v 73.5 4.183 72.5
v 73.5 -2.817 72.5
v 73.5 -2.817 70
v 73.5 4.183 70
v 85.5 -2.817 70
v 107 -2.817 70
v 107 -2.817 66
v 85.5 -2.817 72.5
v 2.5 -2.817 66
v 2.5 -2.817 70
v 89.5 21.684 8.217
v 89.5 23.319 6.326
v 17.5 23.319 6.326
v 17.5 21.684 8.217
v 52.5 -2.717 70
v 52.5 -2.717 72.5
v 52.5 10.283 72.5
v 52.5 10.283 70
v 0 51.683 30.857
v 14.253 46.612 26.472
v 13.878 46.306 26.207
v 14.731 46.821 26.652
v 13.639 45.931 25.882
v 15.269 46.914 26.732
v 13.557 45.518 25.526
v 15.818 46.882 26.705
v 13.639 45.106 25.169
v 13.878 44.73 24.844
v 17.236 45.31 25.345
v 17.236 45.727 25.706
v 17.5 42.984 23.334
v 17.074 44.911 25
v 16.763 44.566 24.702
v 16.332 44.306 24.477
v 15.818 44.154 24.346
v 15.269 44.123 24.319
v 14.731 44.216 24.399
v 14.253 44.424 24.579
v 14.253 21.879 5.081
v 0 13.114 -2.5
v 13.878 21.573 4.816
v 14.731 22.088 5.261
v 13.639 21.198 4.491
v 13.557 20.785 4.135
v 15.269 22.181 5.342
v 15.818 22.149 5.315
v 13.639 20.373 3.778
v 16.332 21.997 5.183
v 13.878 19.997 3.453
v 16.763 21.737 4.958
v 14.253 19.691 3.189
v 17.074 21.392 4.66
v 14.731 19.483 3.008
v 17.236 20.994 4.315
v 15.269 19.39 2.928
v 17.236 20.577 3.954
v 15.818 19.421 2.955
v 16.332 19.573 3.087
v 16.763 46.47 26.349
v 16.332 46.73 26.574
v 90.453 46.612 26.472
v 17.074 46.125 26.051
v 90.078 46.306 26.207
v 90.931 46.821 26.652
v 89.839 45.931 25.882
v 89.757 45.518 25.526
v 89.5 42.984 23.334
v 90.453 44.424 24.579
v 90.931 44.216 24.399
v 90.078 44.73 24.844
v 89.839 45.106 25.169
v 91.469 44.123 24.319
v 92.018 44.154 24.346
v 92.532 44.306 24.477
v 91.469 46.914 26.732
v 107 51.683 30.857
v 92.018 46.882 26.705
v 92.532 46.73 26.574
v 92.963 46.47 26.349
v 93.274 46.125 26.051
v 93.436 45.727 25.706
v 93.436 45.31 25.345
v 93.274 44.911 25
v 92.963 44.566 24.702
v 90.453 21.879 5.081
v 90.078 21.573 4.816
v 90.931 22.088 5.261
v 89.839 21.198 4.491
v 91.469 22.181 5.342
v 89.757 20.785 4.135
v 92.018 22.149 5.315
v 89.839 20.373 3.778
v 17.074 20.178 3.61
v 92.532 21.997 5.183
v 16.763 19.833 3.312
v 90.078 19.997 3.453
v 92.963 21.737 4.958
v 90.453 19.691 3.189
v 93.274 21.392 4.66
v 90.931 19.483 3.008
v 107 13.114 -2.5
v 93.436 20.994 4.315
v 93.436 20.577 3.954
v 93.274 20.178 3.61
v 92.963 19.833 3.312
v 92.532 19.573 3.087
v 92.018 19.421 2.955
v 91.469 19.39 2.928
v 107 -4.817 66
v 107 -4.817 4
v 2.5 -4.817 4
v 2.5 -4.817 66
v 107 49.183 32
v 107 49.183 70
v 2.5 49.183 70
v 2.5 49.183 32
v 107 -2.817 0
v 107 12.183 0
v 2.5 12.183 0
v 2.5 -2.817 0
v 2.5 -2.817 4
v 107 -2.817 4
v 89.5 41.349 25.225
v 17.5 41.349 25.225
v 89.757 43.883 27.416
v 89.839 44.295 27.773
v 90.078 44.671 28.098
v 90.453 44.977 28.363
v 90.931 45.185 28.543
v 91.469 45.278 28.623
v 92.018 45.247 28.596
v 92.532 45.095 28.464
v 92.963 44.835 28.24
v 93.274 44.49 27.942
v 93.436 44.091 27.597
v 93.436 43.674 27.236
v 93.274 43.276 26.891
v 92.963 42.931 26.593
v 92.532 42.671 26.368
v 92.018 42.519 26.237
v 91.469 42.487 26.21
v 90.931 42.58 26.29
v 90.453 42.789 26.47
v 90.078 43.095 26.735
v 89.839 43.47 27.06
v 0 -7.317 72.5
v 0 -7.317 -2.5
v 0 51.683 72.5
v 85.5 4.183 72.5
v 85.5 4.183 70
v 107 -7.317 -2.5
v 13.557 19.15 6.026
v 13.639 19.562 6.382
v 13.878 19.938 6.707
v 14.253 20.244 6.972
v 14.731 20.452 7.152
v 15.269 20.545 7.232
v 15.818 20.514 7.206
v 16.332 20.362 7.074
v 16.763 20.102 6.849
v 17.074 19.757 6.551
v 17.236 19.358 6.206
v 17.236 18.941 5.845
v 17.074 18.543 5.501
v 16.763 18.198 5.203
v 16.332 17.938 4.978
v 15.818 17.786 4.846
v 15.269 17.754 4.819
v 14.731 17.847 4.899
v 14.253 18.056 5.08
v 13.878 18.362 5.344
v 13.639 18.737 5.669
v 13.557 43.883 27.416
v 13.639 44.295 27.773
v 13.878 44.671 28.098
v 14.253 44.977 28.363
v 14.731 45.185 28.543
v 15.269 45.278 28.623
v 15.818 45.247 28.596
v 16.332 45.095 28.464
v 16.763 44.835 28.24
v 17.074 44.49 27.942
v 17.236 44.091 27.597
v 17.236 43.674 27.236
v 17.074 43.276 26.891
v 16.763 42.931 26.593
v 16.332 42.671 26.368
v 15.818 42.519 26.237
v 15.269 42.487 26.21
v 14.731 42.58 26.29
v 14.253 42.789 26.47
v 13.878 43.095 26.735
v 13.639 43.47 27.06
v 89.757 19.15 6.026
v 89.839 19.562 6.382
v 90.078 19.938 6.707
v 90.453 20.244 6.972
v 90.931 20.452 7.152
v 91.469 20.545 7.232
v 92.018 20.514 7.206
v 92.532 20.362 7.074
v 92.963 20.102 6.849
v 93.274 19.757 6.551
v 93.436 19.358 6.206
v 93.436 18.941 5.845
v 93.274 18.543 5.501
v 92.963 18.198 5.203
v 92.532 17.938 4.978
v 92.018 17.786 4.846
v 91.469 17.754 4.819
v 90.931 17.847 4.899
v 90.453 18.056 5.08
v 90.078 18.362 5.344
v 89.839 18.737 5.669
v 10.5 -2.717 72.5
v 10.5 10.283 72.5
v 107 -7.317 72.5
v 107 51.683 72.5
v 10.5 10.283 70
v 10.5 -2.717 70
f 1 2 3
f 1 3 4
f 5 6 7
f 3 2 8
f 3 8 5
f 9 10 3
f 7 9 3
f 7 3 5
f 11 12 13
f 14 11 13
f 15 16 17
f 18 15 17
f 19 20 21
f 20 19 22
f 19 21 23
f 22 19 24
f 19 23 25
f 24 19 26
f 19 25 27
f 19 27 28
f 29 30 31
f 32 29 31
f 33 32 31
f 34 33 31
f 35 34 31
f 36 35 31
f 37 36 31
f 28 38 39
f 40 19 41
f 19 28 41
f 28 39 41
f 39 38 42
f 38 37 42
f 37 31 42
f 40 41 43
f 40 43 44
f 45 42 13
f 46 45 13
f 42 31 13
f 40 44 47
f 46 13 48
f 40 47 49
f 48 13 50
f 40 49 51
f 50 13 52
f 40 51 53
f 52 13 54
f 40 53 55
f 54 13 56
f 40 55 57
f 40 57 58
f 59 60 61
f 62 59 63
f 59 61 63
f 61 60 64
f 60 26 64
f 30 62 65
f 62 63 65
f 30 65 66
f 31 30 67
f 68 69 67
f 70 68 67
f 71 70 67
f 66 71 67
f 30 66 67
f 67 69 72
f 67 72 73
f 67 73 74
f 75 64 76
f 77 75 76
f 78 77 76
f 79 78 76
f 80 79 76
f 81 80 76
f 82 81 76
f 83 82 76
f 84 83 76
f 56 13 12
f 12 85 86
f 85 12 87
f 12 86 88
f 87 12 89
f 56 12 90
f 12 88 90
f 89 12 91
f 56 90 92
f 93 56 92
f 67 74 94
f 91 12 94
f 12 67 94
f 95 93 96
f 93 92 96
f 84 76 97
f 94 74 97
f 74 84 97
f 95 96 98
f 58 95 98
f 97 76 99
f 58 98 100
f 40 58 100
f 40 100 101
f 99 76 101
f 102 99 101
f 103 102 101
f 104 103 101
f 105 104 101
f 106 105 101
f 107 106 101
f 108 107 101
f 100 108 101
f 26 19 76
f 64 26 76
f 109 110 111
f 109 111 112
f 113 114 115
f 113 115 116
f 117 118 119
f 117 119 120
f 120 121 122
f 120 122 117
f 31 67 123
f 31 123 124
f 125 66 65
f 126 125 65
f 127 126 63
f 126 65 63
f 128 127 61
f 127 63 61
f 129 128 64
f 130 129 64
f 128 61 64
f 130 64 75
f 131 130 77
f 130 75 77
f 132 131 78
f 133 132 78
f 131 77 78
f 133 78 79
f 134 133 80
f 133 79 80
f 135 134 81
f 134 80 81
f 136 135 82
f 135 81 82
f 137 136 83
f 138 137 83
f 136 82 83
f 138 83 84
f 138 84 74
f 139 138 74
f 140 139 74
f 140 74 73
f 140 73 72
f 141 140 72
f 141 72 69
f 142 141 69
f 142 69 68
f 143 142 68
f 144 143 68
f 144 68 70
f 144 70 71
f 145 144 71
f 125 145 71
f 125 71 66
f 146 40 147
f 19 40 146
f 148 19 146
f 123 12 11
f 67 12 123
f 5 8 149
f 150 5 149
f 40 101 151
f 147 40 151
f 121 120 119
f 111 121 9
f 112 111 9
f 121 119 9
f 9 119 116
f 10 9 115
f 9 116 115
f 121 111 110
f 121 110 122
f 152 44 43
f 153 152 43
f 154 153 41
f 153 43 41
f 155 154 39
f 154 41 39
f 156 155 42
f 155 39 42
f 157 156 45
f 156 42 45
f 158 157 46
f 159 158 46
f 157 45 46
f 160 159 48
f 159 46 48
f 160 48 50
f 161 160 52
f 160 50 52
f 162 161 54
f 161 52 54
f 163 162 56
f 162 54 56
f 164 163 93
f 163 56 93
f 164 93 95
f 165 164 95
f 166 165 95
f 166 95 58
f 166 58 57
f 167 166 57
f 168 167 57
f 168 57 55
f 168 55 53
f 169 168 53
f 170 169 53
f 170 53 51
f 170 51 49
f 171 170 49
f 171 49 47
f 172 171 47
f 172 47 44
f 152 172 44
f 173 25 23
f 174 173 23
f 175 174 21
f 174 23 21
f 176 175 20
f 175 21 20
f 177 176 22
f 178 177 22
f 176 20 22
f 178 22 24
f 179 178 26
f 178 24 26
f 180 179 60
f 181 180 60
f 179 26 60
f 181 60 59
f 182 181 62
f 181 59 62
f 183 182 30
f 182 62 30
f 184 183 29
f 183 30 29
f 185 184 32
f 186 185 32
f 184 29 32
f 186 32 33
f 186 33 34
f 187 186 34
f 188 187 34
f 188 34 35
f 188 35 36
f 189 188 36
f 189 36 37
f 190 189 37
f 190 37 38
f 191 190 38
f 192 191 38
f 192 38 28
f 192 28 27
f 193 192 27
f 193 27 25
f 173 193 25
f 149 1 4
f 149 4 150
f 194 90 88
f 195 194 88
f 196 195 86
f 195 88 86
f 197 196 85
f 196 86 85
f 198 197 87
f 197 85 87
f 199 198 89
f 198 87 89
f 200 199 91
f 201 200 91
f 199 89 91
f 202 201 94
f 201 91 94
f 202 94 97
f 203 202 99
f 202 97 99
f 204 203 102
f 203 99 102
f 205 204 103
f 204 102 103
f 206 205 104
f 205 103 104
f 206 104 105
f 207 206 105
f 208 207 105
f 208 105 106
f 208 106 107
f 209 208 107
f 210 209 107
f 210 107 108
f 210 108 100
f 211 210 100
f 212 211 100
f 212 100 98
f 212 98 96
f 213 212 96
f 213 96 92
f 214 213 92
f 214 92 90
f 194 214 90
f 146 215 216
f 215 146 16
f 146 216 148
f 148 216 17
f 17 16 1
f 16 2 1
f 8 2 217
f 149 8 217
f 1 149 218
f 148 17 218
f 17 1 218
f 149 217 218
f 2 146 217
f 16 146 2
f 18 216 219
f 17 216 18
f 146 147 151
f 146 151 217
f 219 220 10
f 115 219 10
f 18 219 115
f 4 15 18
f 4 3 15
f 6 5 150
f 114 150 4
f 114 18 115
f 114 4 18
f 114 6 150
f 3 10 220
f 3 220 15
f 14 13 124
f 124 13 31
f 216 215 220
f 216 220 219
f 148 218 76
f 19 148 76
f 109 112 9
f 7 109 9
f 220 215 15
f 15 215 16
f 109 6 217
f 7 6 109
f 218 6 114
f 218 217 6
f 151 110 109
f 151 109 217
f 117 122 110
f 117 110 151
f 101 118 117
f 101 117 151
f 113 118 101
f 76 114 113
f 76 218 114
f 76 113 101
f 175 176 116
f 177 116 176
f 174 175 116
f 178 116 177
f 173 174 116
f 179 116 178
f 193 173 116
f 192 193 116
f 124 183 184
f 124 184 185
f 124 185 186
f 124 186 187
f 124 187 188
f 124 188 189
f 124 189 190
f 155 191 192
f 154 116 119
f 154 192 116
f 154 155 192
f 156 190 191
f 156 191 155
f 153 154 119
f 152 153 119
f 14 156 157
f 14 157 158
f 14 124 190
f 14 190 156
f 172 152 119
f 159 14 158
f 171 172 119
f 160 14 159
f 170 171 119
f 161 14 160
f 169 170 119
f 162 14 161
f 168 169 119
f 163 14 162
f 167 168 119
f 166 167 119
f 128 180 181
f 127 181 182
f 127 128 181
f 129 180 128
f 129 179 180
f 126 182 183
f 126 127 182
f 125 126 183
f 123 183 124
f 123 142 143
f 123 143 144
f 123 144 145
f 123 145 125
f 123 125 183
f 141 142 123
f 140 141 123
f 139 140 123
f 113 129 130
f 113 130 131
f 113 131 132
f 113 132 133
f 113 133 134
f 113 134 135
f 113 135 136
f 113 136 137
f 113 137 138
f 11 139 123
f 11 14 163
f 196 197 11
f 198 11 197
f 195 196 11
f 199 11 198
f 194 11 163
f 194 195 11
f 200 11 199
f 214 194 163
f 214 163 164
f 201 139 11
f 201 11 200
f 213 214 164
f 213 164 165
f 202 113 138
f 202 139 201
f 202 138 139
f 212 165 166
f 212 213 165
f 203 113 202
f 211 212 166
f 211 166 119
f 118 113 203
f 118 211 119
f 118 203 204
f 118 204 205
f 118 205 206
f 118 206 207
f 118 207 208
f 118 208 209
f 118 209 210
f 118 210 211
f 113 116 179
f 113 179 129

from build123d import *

# Parameters (mm, degrees)
BOSS_EXTRUDE2_DEPTH = 107
BOSS_EXTRUDE3_DEPTH = 107
CUT_EXTRUDE4_DEPTH  = 104.5
SKETCH4_W           = 4
SKETCH4_H           = 2
BOSS_EXTRUDE4_DEPTH = 104.5
SKETCH6_W           = 42
SKETCH6_H           = 13
CUT_EXTRUDE5_DEPTH  = 3
SKETCH7_W           = 12
SKETCH7_H           = 7
CUT_EXTRUDE6_DEPTH  = 3
SKETCH8_W           = 72
SKETCH8_H           = 26
CUT_EXTRUDE7_DEPTH  = 3
SKETCH9_R           = 1.85
CUT_EXTRUDE8_DEPTH  = 3


with BuildPart() as part:
    # Sketch1 → Boss-Extrude2 (new body)
    with BuildSketch(Plane(origin=(0, 0, 0), x_dir=(0, 0, -1), z_dir=(1, 0, 0))):
        Polygon((-70, 49.18258427), (-32, 49.18258427), (0, 12.18258427), (0, -4.81741573), (-70, -4.81741573), align=None)
    extrude(amount=BOSS_EXTRUDE2_DEPTH)

    # Sketch2 → Boss-Extrude3 (add)
    with BuildSketch(Plane(origin=(107, 0, 0), x_dir=(0, 0, -1), z_dir=(1, 0, 0))):
        Polygon((-72.5, -7.31741573), (-72.5, 51.68258427), (-30.856871673, 51.68258427), (2.5, 13.113701397), (2.5, -7.31741573), align=None)
        Polygon((-70, 49.18258427), (-32, 49.18258427), (0, 12.18258427), (0, -4.81741573), (-70, -4.81741573), align=None, mode=Mode.SUBTRACT)
    extrude(amount=-BOSS_EXTRUDE3_DEPTH)

    # Sketch3 → Cut-Extrude4 (cut)
    with BuildSketch(Plane(origin=(107, 0, 0), x_dir=(0, 0, -1), z_dir=(1, 0, 0))):
        Polygon((0, -4.81741573), (-70, -4.81741573), (-70, 49.18258427), (-32, 49.18258427), (0, 12.18258427), align=None)
    extrude(amount=-CUT_EXTRUDE4_DEPTH, mode=Mode.SUBTRACT)

    # Sketch4 → Boss-Extrude4 (add)
    with BuildSketch(Plane(origin=(2.5, 0, 0), x_dir=(0, 0, -1), z_dir=(1, 0, 0))):
        with Locations((-68, -3.81741573)):
            Rectangle(SKETCH4_W, SKETCH4_H)
        with Locations((-2, -3.81741573)):
            Rectangle(SKETCH4_W, SKETCH4_H)
    extrude(amount=BOSS_EXTRUDE4_DEPTH)

    # Sketch6 → Cut-Extrude5 (cut)
    with BuildSketch(Plane.XY.offset(72.5)):
        with Locations((31.5, 3.78258427)):
            Rectangle(SKETCH6_W, SKETCH6_H)
    extrude(amount=-CUT_EXTRUDE5_DEPTH, mode=Mode.SUBTRACT)

    # Sketch7 → Cut-Extrude6 (cut)
    with BuildSketch(Plane.XY.offset(72.5)):
        with Locations((79.5, 0.68258427)):
            Rectangle(SKETCH7_W, SKETCH7_H)
    extrude(amount=-CUT_EXTRUDE6_DEPTH, mode=Mode.SUBTRACT)

    # Sketch8 → Cut-Extrude7 (cut)
    with BuildSketch(Plane(origin=(0, 6.848487351, -7.9185635), x_dir=(-1, 0, 0), z_dir=(0, 0.654151933, -0.756363172))):
        with Locations((-53.5, 34.775885648)):
            Rectangle(SKETCH8_W, SKETCH8_H)
    extrude(amount=-CUT_EXTRUDE7_DEPTH, mode=Mode.SUBTRACT)

    # Sketch9 → Cut-Extrude8 (cut)
    with BuildSketch(Plane(origin=(0, 6.848487351, -7.9185635), x_dir=(-1, 0, 0), z_dir=(0, 0.654151933, -0.756363172))):
        with Locations((-91.606829089, 51.125885648)):
            Circle(SKETCH9_R)
        with Locations((-15.406829089, 51.125885648)):
            Circle(SKETCH9_R)
        with Locations((-15.406829089, 18.425885648)):
            Circle(SKETCH9_R)
        with Locations((-91.606829089, 18.425885648)):
            Circle(SKETCH9_R)
    extrude(amount=-CUT_EXTRUDE8_DEPTH, mode=Mode.SUBTRACT)


solid = part.part
